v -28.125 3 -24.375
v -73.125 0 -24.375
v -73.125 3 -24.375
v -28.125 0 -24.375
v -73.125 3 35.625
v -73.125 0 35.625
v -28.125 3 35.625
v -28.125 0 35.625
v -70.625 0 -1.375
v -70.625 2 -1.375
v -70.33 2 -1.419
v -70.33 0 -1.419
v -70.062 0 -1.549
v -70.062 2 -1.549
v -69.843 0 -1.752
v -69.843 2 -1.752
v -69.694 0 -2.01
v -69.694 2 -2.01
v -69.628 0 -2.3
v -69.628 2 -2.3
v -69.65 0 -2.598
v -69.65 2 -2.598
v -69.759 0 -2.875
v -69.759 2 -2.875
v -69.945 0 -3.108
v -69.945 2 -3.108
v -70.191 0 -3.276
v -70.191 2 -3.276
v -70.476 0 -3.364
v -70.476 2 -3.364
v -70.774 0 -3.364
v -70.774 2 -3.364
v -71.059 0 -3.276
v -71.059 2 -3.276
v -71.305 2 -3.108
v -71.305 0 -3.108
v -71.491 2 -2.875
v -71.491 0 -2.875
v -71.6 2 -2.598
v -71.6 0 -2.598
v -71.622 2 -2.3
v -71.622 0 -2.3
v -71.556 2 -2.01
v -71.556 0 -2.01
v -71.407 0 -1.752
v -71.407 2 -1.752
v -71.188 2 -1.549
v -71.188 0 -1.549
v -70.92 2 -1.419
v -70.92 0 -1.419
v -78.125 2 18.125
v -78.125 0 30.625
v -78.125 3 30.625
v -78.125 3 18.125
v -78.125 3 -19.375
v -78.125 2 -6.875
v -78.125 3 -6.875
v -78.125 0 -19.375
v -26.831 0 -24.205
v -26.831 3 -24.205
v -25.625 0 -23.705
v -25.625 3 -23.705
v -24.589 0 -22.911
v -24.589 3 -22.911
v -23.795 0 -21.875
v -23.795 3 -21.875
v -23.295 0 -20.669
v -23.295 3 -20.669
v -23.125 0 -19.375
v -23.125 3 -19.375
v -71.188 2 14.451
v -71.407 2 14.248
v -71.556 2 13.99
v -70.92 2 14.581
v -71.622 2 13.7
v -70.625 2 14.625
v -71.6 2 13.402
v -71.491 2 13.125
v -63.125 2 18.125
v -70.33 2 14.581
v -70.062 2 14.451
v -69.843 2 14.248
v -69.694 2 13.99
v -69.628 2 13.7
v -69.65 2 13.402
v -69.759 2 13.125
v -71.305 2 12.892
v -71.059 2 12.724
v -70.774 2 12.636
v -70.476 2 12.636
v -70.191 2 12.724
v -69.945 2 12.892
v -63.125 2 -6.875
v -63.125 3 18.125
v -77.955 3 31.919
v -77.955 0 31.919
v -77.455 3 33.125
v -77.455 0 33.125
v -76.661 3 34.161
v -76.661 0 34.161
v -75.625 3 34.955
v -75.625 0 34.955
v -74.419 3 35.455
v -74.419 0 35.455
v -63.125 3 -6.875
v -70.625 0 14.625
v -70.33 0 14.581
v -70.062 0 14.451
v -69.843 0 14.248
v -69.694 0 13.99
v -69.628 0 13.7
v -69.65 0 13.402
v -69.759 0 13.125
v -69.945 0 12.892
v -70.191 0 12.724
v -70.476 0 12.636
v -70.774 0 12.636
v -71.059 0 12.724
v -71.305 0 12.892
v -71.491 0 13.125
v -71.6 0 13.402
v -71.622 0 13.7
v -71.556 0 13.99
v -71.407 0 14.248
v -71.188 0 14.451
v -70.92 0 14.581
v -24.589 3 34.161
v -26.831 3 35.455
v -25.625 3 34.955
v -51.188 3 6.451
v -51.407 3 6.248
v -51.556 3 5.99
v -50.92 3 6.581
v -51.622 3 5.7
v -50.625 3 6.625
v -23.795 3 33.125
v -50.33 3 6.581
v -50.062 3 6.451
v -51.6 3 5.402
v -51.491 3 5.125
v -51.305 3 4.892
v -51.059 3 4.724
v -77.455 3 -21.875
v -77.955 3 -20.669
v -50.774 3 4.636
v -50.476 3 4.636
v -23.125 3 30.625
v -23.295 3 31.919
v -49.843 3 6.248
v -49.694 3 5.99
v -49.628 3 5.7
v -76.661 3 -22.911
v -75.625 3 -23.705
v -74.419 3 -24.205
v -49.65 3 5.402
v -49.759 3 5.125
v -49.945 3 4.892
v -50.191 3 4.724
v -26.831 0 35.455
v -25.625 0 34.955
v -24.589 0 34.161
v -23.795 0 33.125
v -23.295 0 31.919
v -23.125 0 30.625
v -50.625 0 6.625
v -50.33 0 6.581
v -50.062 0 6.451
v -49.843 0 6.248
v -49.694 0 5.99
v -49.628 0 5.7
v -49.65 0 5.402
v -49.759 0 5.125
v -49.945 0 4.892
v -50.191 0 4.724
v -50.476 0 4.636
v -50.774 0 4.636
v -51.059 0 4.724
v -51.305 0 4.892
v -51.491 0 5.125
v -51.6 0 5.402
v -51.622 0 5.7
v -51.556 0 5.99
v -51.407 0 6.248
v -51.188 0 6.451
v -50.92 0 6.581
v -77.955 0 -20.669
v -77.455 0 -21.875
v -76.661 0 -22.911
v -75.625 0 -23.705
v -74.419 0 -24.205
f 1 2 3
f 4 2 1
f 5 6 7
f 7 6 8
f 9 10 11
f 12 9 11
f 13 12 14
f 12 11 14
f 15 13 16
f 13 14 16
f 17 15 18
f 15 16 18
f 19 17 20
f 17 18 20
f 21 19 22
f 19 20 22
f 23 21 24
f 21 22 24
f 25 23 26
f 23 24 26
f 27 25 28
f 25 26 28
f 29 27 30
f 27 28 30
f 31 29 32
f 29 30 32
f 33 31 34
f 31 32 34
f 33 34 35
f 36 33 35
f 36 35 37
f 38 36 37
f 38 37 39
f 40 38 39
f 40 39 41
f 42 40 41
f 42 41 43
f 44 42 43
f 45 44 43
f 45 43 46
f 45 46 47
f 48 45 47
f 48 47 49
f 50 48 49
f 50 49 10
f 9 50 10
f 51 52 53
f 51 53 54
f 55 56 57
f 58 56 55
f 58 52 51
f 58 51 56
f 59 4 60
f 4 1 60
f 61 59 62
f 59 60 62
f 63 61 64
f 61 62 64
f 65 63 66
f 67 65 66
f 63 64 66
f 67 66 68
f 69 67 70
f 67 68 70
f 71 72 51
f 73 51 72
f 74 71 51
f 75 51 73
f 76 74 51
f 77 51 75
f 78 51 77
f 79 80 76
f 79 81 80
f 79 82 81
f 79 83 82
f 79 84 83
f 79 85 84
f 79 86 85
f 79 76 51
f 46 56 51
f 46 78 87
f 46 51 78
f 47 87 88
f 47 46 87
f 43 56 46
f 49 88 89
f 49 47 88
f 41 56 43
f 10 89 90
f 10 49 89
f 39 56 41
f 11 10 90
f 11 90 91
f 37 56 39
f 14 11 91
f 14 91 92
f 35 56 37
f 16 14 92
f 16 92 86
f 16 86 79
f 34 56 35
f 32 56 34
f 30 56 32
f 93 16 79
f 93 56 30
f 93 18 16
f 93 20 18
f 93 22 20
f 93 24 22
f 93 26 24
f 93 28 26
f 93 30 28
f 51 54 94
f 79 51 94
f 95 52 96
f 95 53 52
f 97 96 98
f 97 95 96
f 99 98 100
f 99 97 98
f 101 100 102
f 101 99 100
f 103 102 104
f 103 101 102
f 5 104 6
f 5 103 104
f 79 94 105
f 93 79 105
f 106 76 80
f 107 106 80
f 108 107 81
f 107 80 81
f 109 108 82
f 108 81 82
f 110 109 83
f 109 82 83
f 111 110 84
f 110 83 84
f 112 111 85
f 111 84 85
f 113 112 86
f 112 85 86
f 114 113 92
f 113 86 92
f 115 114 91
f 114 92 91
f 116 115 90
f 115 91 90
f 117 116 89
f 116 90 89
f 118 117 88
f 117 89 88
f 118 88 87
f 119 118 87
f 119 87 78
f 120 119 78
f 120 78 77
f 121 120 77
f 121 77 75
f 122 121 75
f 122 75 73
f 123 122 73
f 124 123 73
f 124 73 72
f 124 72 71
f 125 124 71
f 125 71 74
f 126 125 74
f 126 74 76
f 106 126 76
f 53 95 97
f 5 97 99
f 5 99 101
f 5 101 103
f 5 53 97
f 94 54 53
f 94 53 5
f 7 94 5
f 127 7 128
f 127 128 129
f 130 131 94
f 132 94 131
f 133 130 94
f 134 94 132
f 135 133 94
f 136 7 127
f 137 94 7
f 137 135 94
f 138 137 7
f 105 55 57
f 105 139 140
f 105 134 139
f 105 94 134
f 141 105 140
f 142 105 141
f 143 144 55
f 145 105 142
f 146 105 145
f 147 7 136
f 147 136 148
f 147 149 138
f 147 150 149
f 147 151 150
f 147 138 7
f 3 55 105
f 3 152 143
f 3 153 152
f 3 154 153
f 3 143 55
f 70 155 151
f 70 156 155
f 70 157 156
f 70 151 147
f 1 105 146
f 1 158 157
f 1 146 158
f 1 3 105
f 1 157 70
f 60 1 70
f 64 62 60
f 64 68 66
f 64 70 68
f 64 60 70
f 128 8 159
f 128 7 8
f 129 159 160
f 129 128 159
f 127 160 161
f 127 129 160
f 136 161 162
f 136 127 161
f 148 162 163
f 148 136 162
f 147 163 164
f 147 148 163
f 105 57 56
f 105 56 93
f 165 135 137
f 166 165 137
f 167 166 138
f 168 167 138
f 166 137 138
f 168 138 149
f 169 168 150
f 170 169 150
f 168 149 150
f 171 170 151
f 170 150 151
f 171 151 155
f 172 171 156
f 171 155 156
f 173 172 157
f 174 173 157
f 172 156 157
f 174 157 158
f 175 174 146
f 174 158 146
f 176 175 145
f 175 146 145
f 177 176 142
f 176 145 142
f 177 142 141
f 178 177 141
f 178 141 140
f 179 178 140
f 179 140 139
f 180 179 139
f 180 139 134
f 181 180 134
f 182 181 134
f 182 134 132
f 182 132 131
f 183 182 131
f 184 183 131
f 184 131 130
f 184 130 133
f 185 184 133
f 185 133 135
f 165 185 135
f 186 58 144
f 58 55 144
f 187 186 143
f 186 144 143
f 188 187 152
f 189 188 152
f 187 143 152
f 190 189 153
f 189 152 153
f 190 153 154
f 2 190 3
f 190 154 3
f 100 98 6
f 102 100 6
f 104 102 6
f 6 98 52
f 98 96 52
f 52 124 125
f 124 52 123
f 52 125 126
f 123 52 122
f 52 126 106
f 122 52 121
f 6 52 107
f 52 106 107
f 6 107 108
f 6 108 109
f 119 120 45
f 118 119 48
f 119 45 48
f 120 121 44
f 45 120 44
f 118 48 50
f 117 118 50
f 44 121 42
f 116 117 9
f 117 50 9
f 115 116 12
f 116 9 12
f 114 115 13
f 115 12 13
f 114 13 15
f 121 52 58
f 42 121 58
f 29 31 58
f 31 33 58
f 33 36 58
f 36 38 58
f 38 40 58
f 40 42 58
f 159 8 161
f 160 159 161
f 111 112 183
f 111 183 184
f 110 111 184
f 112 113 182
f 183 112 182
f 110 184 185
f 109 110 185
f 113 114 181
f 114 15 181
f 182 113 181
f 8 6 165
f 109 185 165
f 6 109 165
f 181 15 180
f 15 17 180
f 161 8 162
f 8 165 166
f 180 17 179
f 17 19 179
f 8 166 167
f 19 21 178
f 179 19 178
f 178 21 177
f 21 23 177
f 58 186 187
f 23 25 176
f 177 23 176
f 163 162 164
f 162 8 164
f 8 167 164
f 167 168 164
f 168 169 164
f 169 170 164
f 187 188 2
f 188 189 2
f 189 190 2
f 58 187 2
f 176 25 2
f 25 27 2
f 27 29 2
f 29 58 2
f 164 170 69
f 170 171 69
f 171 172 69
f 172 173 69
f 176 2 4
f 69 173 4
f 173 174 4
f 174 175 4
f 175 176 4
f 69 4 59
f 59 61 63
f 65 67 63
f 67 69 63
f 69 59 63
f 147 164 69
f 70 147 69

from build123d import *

# Parameters (mm, degrees)
SKETCH2_W           = 55
SKETCH2_H           = 60
BOSS_EXTRUDE1_DEPTH = 3
SKETCH3_W           = 15
SKETCH3_H           = 25
CUT_EXTRUDE1_DEPTH  = 1
SKETCH4_R           = 1
CUT_EXTRUDE3_DEPTH  = 5
FILLET1_R           = 5
SKETCH5_R           = 1
CUT_EXTRUDE4_DEPTH  = 5


with BuildPart() as part:
    # Sketch2 → Boss-Extrude1 (new body)
    with BuildSketch(Plane(origin=(0, 0, 0), x_dir=(1, 0, 0), z_dir=(0, 1, 0))):
        with Locations((-50.625, -5.625)):
            Rectangle(SKETCH2_W, SKETCH2_H)
    extrude(amount=BOSS_EXTRUDE1_DEPTH)

    # Sketch3 → Cut-Extrude1 (cut)
    with BuildSketch(Plane(origin=(0, 3, 0), x_dir=(1, 0, 0), z_dir=(0, 1, 0))):
        with Locations((-70.625, -5.625)):
            Rectangle(SKETCH3_W, SKETCH3_H)
    extrude(amount=-CUT_EXTRUDE1_DEPTH, mode=Mode.SUBTRACT)

    # Sketch4 → Cut-Extrude3 (cut)
    with BuildSketch(Plane(origin=(0, 3, 0), x_dir=(1, 0, 0), z_dir=(0, 1, 0))):
        with Locations(Location((-70.625, 2.375, 0), (0, 0, 270))):
            Circle(SKETCH4_R)
        with Locations(Location((-70.625, -13.625, 0), (0, 0, 270))):
            Circle(SKETCH4_R)
    extrude(amount=-CUT_EXTRUDE3_DEPTH, mode=Mode.SUBTRACT)

    # Fillet1
    fillet1_edges = [part.edges().sort_by_distance(p)[0] for p in [
        (-78.125, 1.5, -24.375),
        (-23.125, 1.5, -24.375),
        (-23.125, 1.5, 35.625),
        (-78.125, 1.5, 35.625),
    ]]
    fillet(fillet1_edges, radius=FILLET1_R)

    # Sketch5 → Cut-Extrude4 (cut)
    with BuildSketch(Plane(origin=(0, 3, 0), x_dir=(1, 0, 0), z_dir=(0, 1, 0))):
        with Locations(Location((-50.625, -5.625, 0), (0, 0, 270))):
            Circle(SKETCH5_R)
    extrude(amount=-CUT_EXTRUDE4_DEPTH, mode=Mode.SUBTRACT)


solid = part.part
